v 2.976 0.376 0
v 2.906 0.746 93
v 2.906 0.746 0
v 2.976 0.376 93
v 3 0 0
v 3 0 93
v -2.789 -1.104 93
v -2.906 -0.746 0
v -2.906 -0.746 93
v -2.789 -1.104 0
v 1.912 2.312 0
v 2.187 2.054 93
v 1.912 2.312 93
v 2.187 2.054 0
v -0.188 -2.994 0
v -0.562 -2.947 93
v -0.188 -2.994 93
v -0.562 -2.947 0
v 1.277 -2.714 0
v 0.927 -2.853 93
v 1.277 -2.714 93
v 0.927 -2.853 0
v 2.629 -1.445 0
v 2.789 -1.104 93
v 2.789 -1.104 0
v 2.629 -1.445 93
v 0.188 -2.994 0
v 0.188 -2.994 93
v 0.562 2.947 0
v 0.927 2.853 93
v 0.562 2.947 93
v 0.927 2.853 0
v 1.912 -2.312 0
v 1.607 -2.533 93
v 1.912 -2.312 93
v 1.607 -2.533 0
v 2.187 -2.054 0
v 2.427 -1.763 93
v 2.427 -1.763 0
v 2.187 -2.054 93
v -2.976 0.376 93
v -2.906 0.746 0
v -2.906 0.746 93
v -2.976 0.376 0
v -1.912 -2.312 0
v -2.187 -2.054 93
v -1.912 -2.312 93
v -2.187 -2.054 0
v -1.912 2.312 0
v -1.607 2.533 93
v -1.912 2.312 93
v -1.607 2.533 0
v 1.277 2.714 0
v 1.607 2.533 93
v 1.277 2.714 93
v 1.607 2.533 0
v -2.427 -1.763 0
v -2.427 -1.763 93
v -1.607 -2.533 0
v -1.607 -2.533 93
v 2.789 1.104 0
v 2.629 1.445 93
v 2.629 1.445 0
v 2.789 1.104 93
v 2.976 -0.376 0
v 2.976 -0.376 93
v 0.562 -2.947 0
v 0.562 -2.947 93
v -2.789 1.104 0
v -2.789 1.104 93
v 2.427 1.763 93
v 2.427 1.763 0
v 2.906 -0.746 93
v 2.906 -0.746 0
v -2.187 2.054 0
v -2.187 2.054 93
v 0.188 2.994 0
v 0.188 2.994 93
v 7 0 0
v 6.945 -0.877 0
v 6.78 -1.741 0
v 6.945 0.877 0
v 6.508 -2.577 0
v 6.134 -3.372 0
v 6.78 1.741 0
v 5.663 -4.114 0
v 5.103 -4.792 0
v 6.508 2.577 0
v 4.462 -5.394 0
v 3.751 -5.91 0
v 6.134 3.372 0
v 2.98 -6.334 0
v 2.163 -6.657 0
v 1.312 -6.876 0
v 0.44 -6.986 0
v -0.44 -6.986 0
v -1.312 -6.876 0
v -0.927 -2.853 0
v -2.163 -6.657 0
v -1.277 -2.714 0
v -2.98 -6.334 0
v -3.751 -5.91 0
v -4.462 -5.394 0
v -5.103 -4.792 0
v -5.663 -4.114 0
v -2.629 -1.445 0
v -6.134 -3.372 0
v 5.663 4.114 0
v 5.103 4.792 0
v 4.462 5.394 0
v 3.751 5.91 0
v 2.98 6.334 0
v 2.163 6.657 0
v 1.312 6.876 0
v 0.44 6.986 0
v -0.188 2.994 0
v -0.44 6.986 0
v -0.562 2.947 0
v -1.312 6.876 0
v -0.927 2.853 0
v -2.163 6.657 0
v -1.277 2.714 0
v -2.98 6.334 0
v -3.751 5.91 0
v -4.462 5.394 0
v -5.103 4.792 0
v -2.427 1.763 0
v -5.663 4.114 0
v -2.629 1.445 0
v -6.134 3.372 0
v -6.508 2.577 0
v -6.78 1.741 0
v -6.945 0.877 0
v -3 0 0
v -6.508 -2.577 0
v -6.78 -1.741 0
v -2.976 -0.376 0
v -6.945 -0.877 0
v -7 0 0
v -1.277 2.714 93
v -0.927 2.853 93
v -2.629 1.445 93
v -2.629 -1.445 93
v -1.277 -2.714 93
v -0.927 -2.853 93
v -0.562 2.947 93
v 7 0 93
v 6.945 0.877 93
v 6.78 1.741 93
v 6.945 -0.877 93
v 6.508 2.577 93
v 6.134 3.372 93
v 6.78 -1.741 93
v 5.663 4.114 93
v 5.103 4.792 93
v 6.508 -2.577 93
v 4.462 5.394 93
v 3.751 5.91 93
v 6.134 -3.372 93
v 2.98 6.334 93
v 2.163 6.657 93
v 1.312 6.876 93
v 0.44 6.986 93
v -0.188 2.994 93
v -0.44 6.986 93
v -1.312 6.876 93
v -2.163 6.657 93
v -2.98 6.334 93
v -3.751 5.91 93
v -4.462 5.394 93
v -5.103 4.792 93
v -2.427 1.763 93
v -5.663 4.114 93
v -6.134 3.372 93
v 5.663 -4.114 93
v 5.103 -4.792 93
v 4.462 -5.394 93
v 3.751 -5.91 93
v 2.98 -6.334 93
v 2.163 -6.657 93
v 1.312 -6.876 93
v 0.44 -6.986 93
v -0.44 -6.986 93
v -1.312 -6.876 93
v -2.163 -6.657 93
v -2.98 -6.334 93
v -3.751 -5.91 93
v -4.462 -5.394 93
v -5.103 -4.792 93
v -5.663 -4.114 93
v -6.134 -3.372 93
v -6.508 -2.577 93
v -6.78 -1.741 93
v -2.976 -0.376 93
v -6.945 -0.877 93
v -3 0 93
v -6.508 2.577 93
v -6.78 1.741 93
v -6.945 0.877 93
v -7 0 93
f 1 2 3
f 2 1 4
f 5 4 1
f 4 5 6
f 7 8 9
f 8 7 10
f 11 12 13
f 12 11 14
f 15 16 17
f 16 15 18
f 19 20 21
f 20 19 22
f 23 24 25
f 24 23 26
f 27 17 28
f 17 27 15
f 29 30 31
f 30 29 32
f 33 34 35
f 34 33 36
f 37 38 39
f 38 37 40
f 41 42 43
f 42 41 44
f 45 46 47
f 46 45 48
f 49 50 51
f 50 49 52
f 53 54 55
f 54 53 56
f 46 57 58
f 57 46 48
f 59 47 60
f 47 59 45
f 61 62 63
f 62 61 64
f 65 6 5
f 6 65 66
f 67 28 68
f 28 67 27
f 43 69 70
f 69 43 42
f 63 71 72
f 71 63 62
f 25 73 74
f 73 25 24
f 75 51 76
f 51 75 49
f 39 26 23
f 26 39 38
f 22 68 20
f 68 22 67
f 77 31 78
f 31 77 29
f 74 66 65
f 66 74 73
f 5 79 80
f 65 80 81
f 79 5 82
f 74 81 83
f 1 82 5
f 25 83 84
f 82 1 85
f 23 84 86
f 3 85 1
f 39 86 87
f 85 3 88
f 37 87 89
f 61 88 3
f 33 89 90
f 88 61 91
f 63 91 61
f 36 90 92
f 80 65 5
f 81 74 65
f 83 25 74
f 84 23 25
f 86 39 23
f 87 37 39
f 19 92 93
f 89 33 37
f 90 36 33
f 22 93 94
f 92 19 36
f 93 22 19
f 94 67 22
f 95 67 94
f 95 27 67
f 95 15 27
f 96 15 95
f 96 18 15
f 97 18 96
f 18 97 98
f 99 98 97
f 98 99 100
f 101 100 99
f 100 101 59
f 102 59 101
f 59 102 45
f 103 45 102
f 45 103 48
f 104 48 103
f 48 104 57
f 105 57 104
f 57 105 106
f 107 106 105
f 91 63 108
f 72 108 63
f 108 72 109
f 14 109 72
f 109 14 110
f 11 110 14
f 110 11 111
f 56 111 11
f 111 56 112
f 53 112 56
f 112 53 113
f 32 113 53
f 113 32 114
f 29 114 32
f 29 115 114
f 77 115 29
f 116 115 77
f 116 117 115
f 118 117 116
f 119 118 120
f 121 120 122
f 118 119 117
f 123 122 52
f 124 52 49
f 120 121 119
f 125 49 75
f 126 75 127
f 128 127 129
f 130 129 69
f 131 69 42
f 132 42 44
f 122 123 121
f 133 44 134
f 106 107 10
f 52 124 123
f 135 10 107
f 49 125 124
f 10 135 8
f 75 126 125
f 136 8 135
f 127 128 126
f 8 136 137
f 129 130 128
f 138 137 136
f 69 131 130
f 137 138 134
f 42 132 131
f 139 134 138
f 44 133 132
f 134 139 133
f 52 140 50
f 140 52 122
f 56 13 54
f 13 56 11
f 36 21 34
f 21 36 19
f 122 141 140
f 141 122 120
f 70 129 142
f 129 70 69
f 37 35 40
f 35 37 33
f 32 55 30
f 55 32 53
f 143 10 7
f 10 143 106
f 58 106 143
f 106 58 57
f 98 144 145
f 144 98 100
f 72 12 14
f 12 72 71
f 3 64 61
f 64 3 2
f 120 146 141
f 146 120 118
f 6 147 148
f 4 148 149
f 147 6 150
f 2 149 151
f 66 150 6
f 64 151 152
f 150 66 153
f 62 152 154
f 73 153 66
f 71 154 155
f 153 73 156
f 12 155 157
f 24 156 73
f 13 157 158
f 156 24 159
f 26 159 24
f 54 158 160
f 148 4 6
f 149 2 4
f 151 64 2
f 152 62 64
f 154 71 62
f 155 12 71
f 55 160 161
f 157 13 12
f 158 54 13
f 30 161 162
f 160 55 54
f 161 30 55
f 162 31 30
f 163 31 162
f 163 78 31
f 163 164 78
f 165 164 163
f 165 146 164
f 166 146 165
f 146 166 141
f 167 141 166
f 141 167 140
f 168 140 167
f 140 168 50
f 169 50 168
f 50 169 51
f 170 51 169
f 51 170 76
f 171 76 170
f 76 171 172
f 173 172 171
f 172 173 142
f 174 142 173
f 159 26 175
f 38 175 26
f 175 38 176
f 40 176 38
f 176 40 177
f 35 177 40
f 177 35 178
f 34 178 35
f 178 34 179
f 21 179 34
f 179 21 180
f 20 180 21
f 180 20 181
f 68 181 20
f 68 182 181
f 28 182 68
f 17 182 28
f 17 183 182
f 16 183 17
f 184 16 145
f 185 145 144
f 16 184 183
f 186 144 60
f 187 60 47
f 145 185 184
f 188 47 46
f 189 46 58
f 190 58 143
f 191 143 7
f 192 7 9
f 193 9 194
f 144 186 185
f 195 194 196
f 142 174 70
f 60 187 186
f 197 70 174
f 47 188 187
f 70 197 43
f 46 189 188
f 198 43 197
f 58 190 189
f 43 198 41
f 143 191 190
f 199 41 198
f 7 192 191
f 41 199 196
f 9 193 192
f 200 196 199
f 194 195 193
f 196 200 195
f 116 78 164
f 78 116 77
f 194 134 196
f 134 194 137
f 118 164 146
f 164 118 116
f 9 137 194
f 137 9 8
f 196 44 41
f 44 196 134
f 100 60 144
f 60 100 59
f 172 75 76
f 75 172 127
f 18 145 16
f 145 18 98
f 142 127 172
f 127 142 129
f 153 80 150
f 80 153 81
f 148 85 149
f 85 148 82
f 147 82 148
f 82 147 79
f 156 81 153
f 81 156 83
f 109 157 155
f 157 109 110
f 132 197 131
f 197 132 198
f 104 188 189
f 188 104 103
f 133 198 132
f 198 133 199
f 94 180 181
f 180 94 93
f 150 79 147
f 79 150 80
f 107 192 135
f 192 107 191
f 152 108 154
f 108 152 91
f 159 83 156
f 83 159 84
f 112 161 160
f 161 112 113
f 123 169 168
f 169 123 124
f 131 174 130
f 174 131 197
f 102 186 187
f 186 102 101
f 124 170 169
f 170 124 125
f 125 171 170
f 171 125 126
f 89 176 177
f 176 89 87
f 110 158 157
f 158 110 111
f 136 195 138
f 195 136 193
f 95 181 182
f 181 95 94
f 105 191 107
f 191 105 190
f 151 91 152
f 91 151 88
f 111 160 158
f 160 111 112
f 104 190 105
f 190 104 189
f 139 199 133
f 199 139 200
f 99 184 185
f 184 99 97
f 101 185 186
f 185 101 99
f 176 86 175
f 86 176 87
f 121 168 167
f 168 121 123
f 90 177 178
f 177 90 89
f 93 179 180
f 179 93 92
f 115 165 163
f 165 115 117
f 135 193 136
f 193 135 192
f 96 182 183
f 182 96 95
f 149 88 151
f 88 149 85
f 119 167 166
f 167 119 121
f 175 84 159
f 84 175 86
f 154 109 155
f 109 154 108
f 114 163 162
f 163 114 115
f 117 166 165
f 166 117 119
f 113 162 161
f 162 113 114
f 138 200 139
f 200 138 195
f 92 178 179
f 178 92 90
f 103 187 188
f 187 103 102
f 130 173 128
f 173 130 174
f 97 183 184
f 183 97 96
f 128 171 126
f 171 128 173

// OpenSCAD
$fn = 50;


difference() {
	union() {
		cylinder(h = 93, r = 7.0000000000);
	}
	union() {
		cylinder(h = 93, r = 3.0000000000);
		cylinder(h = 93, r = 1.5000000000);
		cylinder(h = 93, r = 1.5000000000);
		cylinder(h = 93, r = 1.5000000000);
	}
}
